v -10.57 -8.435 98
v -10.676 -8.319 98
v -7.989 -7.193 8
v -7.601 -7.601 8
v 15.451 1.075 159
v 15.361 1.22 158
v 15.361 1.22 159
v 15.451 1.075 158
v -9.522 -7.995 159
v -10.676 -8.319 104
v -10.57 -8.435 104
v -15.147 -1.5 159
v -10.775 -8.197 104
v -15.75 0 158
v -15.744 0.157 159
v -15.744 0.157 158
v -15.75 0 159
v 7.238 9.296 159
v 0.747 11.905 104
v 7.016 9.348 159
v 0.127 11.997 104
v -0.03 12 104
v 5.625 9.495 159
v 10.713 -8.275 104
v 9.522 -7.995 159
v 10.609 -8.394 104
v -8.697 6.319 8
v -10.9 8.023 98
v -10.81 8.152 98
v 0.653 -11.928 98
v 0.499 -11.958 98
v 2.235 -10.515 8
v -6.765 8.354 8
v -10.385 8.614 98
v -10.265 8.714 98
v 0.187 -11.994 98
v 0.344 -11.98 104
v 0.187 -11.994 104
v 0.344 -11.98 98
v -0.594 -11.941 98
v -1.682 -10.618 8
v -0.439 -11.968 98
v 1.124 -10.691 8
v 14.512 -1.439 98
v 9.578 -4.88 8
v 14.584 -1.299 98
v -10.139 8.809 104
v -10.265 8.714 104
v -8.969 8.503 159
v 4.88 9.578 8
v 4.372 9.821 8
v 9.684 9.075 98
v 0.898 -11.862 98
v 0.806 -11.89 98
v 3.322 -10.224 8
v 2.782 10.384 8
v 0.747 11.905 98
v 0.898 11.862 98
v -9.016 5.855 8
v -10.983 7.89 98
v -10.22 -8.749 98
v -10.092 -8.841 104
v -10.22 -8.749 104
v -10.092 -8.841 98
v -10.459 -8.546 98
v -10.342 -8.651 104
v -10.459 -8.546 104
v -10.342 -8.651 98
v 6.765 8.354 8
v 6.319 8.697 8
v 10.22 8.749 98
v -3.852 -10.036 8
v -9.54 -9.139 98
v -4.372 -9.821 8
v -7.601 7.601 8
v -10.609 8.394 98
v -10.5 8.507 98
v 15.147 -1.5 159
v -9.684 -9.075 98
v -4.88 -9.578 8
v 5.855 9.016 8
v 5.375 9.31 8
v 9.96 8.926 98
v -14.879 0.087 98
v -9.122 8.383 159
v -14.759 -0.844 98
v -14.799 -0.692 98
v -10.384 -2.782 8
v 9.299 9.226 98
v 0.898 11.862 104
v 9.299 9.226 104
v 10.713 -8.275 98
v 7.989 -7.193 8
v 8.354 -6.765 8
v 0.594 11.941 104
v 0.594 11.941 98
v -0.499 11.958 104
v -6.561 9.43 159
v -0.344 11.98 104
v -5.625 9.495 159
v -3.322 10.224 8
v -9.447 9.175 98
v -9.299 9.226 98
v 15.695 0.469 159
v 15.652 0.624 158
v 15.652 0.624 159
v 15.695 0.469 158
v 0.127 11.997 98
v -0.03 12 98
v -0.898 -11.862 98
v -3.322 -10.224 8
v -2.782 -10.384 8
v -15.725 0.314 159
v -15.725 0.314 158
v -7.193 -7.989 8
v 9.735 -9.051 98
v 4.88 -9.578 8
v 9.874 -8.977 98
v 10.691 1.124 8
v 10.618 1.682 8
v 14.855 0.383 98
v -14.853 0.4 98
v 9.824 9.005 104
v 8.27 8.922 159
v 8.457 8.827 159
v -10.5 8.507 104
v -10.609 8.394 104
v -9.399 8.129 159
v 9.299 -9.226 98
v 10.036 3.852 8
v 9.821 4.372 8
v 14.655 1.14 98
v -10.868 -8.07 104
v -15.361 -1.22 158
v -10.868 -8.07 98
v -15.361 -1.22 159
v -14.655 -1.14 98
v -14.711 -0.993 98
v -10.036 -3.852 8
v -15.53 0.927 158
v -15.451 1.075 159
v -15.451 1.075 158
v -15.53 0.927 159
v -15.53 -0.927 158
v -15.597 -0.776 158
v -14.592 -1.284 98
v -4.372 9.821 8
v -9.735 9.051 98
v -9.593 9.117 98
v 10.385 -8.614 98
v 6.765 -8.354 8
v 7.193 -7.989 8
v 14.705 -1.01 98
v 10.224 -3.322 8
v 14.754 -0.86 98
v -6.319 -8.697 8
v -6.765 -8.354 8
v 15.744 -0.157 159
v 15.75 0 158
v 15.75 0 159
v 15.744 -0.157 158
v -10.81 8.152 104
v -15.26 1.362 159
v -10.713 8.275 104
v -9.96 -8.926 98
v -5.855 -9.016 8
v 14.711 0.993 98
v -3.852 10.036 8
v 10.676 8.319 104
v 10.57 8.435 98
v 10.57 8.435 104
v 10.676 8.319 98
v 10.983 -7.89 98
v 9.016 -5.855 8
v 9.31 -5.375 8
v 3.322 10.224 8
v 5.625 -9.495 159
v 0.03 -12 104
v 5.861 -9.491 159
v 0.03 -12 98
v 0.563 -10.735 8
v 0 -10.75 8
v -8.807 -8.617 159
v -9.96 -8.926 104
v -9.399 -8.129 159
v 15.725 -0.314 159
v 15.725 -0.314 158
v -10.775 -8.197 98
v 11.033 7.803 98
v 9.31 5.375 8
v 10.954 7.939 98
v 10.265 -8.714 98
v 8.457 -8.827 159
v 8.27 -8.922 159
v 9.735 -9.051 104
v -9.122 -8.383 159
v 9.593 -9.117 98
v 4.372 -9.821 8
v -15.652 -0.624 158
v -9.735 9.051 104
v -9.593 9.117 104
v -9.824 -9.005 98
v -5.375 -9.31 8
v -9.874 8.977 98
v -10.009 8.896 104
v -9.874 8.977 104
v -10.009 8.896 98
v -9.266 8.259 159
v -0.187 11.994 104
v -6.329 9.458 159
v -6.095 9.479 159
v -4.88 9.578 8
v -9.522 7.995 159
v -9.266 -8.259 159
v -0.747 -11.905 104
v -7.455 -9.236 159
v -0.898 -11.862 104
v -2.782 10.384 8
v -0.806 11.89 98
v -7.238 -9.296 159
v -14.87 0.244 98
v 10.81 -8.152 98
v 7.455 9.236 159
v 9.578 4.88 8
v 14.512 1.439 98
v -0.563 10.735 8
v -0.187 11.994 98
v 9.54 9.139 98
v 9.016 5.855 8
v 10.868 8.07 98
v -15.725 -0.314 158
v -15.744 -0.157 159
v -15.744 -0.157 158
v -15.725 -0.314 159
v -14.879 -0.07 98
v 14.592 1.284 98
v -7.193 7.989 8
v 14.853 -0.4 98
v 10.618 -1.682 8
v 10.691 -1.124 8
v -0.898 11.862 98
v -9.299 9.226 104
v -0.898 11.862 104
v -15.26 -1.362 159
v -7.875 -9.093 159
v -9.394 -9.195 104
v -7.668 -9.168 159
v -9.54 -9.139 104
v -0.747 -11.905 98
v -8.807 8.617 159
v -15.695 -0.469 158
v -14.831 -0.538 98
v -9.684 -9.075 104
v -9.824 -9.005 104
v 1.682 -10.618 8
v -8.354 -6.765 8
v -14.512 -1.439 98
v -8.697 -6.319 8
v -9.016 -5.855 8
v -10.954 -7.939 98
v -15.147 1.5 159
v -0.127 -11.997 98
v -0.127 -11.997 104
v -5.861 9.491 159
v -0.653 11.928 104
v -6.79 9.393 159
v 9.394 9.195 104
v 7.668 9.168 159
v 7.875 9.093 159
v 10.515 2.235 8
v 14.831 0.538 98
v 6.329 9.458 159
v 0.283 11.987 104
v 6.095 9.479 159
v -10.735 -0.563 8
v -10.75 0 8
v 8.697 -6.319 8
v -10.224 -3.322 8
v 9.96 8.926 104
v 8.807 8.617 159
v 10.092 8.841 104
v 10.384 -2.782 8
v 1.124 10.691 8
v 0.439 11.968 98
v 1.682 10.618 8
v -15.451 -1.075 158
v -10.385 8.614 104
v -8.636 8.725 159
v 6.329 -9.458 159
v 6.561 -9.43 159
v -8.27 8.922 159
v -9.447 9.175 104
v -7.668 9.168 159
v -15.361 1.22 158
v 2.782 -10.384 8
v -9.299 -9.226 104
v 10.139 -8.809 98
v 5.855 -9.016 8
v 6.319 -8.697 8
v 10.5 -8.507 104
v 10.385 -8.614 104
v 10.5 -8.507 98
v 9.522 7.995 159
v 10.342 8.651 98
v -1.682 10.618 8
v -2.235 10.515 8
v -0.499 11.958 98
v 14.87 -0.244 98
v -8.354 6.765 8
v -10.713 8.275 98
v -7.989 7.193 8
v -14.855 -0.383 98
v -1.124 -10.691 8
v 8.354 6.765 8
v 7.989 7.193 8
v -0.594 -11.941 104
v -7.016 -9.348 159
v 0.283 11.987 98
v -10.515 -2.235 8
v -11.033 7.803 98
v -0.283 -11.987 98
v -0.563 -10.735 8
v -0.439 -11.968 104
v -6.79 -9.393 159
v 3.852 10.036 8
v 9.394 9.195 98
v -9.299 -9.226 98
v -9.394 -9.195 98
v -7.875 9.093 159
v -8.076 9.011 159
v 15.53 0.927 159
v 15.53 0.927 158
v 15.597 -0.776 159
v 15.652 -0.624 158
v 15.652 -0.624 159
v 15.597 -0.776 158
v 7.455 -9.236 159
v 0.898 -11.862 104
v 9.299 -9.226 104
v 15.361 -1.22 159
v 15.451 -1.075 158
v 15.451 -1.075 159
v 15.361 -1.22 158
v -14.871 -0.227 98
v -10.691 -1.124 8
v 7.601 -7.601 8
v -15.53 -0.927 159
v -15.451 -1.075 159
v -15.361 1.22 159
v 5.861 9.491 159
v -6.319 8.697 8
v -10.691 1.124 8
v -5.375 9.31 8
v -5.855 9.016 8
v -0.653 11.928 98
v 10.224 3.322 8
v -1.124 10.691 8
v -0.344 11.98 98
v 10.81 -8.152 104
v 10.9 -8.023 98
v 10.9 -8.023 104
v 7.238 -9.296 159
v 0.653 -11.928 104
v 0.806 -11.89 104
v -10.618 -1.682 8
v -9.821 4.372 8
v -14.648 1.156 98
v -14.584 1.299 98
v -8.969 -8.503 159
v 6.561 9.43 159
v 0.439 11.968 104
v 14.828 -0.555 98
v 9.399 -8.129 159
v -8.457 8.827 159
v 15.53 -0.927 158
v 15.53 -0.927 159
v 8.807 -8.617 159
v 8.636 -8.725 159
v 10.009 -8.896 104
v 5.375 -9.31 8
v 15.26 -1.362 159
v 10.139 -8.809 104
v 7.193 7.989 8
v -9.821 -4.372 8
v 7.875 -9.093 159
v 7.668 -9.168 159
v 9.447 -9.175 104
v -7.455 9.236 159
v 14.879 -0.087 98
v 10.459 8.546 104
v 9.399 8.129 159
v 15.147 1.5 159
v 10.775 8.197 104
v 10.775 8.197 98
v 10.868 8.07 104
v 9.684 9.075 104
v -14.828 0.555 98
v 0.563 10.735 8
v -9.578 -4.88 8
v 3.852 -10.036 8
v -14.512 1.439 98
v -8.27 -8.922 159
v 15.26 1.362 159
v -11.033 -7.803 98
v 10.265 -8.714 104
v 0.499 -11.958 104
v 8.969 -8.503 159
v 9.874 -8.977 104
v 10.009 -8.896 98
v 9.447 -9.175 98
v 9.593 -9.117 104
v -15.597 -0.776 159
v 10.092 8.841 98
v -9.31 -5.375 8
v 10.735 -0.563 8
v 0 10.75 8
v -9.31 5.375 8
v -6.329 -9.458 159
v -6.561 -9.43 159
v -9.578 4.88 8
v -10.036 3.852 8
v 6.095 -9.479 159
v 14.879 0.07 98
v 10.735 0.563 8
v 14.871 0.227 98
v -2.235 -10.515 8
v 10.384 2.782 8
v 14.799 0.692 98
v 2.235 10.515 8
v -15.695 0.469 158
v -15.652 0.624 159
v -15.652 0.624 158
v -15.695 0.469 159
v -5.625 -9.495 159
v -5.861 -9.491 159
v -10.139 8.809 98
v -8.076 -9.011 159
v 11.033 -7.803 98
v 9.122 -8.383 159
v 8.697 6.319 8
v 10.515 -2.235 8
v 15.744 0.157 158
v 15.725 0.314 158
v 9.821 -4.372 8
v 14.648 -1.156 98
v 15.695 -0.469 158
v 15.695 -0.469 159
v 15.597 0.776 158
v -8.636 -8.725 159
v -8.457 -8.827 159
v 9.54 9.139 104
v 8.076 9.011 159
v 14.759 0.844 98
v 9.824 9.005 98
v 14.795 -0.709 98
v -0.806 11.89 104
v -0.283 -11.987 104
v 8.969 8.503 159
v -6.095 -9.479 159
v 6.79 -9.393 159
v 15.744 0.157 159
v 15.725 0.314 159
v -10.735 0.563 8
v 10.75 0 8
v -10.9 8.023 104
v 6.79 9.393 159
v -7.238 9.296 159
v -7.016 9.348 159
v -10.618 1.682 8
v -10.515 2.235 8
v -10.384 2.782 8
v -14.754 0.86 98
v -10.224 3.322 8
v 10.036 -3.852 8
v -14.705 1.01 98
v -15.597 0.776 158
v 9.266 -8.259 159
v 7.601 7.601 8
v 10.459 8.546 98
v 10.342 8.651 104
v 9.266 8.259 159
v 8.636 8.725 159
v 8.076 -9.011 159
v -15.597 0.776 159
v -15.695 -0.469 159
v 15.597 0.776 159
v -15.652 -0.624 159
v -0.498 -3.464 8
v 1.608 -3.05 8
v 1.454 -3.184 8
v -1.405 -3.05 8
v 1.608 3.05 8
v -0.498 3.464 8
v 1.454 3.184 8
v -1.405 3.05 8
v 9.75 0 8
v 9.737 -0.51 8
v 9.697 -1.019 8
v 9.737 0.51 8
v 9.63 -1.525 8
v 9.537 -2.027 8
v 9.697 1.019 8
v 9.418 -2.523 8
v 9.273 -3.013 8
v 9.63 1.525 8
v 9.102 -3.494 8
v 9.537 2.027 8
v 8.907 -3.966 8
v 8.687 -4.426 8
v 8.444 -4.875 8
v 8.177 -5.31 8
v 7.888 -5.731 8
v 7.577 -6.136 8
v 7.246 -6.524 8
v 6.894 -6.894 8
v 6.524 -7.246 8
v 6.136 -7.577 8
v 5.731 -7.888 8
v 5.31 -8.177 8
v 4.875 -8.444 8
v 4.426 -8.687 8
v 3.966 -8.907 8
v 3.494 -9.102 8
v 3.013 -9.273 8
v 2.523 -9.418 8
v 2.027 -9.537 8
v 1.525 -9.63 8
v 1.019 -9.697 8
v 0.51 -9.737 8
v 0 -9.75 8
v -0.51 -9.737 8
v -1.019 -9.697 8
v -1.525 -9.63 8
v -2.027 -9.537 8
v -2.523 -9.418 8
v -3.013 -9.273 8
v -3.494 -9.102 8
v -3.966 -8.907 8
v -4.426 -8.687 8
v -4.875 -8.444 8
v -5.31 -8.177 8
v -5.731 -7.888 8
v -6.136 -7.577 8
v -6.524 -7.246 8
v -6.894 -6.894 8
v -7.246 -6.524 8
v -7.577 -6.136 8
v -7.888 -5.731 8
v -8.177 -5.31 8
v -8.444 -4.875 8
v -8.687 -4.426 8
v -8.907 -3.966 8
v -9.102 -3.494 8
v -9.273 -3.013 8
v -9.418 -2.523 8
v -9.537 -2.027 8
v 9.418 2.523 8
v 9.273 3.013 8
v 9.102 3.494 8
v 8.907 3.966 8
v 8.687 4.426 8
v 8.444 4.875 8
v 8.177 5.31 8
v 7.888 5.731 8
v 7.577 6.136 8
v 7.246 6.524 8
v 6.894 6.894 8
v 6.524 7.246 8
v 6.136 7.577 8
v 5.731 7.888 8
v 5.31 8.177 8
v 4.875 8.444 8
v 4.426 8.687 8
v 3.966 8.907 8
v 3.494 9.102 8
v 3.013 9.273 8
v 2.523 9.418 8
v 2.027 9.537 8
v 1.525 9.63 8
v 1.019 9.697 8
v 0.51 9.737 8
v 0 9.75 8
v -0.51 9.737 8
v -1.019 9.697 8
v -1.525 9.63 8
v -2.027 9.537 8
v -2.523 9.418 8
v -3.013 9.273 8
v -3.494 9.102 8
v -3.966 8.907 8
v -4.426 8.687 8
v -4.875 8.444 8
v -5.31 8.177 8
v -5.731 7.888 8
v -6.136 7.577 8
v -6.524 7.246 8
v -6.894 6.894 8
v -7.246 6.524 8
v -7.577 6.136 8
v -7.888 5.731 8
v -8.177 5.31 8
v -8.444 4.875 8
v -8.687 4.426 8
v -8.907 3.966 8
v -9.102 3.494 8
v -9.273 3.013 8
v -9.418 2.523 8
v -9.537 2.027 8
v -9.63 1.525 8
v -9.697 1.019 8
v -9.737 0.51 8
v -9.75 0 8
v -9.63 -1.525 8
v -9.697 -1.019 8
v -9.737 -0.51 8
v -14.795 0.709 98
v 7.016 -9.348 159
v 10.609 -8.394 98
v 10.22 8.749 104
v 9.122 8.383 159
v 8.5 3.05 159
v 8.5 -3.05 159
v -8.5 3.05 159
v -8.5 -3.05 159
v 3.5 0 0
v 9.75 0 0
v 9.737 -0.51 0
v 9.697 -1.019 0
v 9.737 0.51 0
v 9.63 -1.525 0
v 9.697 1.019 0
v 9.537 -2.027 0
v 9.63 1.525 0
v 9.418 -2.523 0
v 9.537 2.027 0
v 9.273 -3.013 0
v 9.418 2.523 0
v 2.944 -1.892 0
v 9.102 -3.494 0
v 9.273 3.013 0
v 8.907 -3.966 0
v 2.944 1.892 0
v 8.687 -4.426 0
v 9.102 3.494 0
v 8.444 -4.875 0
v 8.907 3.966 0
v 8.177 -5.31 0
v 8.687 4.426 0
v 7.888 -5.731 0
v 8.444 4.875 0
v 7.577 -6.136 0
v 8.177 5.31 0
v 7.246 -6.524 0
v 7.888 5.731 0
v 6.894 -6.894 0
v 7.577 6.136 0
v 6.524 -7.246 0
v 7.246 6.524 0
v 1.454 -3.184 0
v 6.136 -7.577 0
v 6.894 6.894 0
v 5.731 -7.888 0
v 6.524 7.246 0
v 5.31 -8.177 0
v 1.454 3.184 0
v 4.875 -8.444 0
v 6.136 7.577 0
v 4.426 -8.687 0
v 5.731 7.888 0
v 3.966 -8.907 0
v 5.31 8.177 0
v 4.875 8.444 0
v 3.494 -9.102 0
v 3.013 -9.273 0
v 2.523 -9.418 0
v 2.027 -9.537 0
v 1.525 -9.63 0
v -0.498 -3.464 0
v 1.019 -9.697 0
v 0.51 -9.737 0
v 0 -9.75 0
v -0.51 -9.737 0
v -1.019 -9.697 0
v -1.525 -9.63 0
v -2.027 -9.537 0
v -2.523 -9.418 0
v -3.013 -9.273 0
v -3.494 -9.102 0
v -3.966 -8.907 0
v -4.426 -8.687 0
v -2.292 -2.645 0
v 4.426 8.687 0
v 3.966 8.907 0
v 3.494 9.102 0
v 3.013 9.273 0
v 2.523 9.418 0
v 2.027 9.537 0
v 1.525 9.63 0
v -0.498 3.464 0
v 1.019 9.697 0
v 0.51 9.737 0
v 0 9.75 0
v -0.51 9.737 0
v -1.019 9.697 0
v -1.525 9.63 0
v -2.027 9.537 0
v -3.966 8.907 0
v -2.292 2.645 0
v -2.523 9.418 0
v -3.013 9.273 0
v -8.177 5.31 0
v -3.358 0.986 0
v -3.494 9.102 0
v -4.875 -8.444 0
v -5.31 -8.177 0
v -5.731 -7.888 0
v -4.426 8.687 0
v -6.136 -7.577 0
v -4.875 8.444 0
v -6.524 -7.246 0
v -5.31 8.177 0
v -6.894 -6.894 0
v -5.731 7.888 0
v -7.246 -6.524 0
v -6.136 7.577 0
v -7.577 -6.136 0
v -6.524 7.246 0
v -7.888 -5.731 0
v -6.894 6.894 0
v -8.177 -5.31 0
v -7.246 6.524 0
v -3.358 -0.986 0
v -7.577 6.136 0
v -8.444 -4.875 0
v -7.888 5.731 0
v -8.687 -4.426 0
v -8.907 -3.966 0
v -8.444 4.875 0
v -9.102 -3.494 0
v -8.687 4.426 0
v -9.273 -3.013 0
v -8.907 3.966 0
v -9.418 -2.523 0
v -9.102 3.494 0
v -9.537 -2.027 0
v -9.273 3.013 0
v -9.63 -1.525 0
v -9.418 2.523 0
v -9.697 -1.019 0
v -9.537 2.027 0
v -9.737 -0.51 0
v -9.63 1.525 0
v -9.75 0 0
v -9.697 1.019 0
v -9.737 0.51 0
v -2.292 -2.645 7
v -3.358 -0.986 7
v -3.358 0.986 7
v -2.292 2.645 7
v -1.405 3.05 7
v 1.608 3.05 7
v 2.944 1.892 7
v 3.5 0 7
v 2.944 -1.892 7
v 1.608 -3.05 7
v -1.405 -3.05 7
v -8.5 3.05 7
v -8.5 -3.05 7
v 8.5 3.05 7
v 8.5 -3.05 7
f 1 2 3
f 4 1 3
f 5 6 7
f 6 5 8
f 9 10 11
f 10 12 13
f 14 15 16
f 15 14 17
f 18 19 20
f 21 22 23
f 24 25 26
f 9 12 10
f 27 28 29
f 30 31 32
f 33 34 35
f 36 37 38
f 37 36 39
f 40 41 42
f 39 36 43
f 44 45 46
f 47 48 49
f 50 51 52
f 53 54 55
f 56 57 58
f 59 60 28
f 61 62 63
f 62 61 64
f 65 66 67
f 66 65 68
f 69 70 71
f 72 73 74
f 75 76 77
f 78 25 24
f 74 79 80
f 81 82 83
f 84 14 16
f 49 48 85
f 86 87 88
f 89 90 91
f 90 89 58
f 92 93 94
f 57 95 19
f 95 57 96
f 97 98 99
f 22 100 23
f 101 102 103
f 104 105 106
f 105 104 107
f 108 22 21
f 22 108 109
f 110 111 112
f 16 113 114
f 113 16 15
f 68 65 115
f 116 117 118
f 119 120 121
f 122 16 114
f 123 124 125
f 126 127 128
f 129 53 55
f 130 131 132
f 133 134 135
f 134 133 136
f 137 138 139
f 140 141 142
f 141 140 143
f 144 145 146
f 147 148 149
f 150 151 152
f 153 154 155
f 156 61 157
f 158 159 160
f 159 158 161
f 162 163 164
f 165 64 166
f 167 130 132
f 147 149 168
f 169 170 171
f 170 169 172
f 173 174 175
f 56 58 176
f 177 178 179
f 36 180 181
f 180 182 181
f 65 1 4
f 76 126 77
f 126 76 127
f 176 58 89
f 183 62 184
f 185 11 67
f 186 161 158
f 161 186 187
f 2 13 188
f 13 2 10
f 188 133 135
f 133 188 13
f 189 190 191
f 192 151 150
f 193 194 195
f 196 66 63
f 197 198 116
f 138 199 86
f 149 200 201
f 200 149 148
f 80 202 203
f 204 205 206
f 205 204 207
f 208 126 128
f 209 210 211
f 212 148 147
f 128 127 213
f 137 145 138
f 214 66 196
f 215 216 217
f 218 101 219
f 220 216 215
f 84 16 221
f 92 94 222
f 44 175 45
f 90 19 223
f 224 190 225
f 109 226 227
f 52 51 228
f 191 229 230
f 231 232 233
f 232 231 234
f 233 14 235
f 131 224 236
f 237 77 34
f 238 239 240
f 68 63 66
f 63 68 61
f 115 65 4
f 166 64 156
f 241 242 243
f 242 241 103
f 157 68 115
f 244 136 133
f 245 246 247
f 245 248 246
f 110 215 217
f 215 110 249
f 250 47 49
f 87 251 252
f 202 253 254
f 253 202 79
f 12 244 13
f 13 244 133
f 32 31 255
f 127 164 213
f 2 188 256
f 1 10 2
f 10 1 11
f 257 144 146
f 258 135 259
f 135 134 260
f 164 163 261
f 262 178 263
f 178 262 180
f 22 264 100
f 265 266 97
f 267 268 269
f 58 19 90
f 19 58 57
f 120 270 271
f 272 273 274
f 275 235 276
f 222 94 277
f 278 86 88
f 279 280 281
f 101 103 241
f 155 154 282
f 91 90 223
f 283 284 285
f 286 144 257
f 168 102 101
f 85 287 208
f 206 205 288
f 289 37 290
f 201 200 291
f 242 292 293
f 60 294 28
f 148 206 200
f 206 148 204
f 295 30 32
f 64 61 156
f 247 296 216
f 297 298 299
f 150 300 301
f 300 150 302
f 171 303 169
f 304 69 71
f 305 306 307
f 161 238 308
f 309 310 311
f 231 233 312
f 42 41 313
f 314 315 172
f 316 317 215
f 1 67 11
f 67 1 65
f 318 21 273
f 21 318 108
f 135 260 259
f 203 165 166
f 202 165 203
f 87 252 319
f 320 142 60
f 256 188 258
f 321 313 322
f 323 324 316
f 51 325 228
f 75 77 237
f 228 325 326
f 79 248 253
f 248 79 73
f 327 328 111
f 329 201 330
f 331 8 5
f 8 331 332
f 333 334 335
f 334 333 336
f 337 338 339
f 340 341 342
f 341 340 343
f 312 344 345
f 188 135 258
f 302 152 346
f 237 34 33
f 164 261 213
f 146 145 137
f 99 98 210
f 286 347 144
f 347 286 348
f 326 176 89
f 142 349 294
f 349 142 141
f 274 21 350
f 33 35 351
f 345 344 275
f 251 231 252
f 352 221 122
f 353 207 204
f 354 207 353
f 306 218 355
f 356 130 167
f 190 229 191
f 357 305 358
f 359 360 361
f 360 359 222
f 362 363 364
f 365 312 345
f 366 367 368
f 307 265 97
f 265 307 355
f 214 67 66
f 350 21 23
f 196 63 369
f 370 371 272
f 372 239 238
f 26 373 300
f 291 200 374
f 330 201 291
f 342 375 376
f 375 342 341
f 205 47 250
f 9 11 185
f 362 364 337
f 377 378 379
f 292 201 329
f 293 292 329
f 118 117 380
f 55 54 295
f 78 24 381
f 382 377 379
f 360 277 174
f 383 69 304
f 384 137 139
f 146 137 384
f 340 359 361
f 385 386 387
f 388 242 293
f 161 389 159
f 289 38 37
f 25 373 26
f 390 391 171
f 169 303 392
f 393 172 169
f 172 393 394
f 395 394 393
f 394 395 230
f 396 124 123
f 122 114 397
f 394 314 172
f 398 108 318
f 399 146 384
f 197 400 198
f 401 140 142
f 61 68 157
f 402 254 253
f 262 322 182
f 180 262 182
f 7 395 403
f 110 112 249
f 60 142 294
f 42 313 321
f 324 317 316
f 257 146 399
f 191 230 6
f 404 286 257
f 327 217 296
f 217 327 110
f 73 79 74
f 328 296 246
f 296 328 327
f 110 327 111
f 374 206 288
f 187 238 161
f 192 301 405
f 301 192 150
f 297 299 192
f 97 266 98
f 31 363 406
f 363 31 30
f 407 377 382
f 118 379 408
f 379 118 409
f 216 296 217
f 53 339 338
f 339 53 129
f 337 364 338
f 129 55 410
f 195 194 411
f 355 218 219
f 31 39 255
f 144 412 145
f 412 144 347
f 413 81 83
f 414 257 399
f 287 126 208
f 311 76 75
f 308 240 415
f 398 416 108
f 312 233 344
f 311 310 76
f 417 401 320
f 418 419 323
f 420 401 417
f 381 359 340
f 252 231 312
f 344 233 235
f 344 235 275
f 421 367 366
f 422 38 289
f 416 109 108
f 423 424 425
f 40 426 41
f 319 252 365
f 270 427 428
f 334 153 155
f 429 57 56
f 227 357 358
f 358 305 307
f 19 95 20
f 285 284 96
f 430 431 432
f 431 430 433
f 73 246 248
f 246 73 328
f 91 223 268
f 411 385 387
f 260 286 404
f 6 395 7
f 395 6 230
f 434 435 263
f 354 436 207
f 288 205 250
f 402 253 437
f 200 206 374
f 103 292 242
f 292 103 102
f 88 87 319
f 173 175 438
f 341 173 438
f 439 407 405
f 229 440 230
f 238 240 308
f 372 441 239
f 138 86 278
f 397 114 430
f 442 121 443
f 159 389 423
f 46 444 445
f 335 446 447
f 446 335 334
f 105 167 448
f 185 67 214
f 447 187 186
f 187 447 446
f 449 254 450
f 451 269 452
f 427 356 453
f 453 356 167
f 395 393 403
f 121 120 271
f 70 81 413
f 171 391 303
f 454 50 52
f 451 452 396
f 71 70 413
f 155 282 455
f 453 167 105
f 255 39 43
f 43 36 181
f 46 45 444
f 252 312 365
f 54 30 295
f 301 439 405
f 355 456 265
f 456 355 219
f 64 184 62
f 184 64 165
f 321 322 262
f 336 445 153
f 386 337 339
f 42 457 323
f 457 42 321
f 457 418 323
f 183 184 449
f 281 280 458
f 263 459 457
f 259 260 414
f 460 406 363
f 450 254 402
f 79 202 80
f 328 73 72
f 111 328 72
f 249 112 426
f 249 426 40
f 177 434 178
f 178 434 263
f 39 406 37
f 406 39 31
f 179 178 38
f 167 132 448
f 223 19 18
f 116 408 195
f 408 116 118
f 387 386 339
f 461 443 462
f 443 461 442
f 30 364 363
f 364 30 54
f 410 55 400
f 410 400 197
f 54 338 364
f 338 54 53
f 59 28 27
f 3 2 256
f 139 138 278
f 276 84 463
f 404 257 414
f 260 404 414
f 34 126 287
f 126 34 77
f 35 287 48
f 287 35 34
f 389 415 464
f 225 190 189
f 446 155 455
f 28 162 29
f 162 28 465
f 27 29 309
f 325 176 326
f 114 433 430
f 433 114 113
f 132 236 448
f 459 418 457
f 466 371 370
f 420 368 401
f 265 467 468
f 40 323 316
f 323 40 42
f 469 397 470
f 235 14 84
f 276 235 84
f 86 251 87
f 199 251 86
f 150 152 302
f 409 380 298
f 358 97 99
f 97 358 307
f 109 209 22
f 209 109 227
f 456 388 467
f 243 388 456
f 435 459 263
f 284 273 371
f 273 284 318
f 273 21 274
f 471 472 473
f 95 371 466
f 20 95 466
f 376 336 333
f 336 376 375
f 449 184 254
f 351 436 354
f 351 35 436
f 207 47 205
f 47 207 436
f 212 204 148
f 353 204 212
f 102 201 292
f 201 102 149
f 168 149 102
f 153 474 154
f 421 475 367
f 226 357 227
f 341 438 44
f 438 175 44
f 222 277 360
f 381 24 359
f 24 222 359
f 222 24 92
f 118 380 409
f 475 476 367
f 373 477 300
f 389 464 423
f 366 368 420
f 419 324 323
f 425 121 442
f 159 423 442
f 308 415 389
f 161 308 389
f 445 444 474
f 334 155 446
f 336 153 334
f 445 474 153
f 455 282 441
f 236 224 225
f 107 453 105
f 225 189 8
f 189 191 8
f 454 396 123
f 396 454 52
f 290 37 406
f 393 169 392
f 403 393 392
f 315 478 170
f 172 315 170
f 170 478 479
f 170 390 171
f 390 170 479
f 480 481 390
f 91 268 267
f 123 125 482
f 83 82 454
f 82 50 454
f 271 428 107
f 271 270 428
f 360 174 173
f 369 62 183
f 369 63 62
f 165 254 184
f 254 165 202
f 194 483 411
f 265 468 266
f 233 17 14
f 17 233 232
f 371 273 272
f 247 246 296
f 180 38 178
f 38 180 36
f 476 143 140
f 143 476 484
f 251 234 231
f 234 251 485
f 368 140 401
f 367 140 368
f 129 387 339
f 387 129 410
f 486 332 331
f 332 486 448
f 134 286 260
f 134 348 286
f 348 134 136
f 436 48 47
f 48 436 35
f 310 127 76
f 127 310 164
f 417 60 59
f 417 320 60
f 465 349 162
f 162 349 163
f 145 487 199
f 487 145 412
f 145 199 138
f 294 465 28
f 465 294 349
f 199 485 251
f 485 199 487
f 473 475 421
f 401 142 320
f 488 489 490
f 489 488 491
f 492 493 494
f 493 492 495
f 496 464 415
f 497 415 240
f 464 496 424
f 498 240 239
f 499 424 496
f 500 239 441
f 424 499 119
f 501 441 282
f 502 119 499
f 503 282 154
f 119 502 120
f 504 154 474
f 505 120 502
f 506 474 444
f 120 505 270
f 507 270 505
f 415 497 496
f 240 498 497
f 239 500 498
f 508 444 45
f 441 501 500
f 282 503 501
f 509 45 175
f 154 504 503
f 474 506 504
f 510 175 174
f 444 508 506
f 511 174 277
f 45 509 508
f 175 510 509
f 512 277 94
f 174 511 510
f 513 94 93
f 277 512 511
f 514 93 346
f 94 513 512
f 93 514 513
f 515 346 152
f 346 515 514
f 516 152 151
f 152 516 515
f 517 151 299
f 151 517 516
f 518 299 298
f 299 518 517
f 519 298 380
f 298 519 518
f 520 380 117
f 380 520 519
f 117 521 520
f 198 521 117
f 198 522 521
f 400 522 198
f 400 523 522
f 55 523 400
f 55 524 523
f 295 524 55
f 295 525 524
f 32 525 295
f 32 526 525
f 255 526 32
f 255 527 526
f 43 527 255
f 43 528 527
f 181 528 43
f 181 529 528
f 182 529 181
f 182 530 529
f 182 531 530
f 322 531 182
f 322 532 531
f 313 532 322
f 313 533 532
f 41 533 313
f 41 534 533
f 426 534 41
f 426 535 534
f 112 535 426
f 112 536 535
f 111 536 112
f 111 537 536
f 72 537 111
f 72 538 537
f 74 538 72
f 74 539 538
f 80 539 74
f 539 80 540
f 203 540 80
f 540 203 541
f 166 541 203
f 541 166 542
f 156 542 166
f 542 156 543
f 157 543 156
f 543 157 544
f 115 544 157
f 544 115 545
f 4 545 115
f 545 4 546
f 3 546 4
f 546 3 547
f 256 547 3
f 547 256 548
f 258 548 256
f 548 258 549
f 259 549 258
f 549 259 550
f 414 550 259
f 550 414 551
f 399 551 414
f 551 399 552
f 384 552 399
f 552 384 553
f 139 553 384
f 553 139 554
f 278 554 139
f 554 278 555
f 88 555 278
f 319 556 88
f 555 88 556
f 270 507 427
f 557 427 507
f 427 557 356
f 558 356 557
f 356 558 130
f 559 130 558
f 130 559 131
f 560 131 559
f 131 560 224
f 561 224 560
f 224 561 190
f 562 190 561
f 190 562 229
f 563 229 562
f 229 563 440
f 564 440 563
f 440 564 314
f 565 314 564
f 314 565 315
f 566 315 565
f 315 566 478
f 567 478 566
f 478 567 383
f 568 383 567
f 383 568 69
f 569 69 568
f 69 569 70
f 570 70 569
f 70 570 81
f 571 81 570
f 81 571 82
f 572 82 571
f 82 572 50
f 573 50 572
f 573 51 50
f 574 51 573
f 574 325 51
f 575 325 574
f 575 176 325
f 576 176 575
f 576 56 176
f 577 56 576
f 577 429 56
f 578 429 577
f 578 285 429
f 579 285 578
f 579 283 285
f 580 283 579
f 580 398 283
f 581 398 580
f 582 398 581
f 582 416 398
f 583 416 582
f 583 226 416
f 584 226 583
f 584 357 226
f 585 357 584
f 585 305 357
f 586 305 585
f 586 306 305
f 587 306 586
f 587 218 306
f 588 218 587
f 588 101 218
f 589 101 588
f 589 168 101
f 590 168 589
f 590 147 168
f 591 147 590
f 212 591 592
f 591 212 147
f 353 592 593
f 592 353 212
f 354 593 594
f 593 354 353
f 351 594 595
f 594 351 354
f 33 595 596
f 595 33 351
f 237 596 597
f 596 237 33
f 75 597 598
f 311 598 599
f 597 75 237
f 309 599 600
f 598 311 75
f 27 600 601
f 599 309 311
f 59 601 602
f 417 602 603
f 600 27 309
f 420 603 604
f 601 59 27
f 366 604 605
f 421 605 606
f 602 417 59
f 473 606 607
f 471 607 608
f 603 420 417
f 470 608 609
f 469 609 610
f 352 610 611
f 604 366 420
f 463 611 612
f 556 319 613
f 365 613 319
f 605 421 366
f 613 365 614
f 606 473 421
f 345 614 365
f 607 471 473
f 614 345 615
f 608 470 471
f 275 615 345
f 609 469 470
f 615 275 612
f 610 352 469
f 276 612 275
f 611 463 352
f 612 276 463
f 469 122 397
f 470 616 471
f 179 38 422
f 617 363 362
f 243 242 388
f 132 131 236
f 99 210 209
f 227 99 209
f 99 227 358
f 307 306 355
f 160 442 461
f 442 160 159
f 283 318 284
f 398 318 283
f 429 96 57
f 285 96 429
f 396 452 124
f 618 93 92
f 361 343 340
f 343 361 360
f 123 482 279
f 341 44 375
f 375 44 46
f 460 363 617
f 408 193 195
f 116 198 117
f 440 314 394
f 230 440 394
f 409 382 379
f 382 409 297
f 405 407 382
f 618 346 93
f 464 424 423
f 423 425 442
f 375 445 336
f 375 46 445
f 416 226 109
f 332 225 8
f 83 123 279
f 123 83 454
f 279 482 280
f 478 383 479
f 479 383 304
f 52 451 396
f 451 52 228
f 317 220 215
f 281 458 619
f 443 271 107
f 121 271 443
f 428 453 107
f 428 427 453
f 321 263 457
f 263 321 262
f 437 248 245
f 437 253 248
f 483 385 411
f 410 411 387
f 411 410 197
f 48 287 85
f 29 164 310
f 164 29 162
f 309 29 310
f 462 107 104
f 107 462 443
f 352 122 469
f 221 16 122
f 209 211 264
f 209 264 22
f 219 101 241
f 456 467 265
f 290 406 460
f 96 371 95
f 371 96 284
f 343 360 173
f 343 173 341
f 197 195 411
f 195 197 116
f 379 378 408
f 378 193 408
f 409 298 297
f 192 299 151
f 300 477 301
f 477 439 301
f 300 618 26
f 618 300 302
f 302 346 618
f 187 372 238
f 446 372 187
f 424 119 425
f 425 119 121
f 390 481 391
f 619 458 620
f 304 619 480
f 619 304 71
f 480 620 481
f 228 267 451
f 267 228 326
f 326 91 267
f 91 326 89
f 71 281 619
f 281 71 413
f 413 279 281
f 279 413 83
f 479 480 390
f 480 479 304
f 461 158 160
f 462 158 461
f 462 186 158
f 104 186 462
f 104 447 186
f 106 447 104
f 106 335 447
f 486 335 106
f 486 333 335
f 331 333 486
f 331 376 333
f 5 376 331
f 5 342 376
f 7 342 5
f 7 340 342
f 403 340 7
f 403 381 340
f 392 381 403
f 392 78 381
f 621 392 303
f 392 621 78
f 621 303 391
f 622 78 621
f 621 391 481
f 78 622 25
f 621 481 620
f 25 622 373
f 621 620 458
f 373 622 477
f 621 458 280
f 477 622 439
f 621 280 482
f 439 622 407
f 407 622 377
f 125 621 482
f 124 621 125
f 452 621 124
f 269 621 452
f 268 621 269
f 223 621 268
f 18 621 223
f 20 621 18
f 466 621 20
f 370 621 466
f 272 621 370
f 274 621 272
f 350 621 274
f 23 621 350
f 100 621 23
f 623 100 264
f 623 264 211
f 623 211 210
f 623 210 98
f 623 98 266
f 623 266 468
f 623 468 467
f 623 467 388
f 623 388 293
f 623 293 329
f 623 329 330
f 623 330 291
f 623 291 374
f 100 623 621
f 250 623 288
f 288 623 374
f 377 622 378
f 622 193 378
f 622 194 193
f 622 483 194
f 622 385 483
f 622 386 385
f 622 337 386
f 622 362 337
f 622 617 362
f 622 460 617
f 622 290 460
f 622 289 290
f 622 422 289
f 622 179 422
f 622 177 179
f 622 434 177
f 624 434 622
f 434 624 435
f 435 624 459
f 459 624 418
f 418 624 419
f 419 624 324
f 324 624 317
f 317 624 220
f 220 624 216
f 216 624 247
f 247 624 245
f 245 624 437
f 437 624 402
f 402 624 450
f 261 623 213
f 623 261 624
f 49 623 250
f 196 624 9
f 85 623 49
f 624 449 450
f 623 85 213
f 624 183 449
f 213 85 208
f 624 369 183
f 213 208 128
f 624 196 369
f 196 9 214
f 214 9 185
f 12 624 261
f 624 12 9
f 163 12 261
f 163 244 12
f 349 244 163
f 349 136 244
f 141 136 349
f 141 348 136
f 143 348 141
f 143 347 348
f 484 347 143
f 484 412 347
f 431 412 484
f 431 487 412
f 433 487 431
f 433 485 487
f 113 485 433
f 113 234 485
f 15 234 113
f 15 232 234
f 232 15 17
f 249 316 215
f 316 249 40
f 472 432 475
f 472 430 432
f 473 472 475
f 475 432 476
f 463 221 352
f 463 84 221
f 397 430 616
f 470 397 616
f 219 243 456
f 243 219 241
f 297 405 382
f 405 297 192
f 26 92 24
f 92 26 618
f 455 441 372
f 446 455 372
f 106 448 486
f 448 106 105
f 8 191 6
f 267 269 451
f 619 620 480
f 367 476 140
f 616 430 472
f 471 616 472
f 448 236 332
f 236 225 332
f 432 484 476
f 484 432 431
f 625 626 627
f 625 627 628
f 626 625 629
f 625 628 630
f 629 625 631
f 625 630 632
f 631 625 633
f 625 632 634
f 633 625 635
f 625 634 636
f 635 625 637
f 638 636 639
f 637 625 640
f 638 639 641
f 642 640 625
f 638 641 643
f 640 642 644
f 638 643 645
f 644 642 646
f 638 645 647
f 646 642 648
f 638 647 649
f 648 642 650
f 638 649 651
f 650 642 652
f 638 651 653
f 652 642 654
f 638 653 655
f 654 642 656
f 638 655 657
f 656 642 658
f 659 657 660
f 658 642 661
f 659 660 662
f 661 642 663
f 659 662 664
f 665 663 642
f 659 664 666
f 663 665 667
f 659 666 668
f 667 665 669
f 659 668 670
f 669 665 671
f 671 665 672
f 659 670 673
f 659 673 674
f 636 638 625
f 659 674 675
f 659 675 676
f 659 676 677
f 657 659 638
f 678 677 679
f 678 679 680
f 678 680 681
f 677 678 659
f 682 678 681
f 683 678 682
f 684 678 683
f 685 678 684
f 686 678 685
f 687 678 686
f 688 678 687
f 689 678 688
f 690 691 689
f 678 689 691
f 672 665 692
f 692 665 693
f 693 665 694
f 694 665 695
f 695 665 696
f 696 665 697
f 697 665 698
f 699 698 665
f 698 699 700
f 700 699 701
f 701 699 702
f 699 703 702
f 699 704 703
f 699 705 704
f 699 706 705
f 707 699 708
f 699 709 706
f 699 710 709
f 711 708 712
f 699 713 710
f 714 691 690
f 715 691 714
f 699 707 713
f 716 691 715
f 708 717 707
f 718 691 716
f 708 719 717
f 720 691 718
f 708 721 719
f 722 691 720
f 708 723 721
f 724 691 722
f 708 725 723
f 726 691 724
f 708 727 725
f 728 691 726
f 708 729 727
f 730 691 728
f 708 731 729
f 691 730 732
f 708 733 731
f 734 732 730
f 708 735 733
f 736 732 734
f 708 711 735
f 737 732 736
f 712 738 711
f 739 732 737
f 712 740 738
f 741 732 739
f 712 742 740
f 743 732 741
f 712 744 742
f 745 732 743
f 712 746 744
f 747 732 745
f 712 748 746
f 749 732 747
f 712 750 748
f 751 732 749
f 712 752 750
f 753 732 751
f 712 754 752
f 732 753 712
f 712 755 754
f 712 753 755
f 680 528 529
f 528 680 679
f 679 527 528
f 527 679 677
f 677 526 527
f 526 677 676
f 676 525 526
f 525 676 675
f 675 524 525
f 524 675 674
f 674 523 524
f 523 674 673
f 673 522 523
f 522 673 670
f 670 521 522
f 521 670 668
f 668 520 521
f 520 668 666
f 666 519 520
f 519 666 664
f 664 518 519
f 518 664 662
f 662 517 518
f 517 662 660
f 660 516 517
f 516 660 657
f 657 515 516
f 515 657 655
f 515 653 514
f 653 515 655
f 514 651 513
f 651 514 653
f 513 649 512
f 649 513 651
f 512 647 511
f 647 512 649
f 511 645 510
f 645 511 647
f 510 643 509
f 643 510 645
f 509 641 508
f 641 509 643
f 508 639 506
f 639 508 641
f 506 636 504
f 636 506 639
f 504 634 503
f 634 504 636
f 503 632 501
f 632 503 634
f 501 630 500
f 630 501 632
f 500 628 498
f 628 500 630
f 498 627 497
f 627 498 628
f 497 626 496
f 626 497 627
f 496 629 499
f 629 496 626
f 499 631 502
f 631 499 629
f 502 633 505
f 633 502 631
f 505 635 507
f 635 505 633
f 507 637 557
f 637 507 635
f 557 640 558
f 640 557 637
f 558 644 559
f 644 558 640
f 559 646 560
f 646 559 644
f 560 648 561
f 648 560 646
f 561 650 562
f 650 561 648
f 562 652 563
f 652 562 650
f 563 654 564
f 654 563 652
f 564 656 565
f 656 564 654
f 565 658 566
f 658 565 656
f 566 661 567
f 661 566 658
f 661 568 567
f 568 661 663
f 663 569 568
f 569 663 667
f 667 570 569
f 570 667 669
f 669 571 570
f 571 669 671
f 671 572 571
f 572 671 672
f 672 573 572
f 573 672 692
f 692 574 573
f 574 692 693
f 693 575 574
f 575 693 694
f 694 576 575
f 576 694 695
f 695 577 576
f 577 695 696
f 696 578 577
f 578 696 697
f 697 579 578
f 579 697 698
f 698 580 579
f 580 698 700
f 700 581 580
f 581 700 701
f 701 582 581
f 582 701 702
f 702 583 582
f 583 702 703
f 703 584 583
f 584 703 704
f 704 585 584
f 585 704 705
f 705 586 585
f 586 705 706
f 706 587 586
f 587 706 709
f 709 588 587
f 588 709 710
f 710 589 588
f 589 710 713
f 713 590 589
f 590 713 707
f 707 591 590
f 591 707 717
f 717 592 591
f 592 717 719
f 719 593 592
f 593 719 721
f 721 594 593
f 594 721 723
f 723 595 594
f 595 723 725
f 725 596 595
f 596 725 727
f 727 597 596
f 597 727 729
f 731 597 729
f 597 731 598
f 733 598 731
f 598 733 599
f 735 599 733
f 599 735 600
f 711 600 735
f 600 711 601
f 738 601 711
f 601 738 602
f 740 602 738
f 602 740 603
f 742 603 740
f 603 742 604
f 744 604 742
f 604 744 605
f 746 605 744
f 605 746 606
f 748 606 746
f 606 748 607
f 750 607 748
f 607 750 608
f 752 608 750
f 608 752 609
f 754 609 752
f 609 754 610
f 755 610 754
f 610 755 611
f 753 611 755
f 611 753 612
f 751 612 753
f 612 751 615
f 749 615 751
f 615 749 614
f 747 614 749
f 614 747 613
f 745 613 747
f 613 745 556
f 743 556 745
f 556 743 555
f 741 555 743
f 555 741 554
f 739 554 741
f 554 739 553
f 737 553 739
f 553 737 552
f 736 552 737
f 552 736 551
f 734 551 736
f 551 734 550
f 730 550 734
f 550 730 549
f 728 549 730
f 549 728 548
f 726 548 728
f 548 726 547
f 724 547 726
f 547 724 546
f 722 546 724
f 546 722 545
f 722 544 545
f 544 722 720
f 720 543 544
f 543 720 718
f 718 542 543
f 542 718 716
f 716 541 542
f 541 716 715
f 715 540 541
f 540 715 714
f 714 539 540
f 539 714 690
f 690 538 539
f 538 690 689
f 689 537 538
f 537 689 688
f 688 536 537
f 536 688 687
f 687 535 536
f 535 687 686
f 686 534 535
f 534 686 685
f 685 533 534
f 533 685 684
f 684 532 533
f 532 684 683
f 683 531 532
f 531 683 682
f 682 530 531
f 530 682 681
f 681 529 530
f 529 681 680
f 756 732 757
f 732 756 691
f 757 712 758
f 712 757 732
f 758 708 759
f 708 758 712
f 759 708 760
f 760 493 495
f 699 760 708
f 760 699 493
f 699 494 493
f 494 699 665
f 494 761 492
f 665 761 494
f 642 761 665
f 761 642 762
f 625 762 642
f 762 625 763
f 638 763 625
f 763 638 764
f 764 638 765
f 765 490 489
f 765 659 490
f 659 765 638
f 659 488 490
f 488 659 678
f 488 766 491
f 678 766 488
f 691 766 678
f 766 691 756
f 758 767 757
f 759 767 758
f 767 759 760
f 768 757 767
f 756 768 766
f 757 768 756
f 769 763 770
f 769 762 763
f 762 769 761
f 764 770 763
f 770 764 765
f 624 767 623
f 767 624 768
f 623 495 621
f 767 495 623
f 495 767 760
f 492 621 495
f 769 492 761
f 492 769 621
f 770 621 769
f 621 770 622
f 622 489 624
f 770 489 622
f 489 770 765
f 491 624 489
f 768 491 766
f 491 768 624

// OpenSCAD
//158 total len
//116 top len
//42 mm bottom len
//20mm bottom dia

//printed like 22 mm toolong
// slot was way small
// real slot is like 16x5.5
//
//difference(){
//linear_extrude(20)
//
//scale([30/20,1])
//offset(r=3,$fn=120)
//circle(d=14, $fn=6);
//    translate([0,0,-1])
//linear_extrude(25)
//square([17,6.1], center=true);
//}

difference() {
    union(){
translate([0,0,8])
hull(){

    
translate([0,0,150])
linear_extrude(1)
scale([30/20,1])
offset(r=3,$fn=120)
circle(d=15, $fn=6);
translate([0,0,90])
linear_extrude(6)
offset(r=3,$fn=120)
scale([33/25, 1])
circle(d=18, $fn=8);
linear_extrude(1)
circle(d=21.5, $fn=120);
}
linear_extrude(8)
difference() {
circle(d=19.5, $fn=120);
circle(d=7);
}
}
//printed slot was 10.2x5.3
translate([0,0,7])
linear_extrude(158)
//origninal was 11,5.8
square([17,6.1], center=true);
}
